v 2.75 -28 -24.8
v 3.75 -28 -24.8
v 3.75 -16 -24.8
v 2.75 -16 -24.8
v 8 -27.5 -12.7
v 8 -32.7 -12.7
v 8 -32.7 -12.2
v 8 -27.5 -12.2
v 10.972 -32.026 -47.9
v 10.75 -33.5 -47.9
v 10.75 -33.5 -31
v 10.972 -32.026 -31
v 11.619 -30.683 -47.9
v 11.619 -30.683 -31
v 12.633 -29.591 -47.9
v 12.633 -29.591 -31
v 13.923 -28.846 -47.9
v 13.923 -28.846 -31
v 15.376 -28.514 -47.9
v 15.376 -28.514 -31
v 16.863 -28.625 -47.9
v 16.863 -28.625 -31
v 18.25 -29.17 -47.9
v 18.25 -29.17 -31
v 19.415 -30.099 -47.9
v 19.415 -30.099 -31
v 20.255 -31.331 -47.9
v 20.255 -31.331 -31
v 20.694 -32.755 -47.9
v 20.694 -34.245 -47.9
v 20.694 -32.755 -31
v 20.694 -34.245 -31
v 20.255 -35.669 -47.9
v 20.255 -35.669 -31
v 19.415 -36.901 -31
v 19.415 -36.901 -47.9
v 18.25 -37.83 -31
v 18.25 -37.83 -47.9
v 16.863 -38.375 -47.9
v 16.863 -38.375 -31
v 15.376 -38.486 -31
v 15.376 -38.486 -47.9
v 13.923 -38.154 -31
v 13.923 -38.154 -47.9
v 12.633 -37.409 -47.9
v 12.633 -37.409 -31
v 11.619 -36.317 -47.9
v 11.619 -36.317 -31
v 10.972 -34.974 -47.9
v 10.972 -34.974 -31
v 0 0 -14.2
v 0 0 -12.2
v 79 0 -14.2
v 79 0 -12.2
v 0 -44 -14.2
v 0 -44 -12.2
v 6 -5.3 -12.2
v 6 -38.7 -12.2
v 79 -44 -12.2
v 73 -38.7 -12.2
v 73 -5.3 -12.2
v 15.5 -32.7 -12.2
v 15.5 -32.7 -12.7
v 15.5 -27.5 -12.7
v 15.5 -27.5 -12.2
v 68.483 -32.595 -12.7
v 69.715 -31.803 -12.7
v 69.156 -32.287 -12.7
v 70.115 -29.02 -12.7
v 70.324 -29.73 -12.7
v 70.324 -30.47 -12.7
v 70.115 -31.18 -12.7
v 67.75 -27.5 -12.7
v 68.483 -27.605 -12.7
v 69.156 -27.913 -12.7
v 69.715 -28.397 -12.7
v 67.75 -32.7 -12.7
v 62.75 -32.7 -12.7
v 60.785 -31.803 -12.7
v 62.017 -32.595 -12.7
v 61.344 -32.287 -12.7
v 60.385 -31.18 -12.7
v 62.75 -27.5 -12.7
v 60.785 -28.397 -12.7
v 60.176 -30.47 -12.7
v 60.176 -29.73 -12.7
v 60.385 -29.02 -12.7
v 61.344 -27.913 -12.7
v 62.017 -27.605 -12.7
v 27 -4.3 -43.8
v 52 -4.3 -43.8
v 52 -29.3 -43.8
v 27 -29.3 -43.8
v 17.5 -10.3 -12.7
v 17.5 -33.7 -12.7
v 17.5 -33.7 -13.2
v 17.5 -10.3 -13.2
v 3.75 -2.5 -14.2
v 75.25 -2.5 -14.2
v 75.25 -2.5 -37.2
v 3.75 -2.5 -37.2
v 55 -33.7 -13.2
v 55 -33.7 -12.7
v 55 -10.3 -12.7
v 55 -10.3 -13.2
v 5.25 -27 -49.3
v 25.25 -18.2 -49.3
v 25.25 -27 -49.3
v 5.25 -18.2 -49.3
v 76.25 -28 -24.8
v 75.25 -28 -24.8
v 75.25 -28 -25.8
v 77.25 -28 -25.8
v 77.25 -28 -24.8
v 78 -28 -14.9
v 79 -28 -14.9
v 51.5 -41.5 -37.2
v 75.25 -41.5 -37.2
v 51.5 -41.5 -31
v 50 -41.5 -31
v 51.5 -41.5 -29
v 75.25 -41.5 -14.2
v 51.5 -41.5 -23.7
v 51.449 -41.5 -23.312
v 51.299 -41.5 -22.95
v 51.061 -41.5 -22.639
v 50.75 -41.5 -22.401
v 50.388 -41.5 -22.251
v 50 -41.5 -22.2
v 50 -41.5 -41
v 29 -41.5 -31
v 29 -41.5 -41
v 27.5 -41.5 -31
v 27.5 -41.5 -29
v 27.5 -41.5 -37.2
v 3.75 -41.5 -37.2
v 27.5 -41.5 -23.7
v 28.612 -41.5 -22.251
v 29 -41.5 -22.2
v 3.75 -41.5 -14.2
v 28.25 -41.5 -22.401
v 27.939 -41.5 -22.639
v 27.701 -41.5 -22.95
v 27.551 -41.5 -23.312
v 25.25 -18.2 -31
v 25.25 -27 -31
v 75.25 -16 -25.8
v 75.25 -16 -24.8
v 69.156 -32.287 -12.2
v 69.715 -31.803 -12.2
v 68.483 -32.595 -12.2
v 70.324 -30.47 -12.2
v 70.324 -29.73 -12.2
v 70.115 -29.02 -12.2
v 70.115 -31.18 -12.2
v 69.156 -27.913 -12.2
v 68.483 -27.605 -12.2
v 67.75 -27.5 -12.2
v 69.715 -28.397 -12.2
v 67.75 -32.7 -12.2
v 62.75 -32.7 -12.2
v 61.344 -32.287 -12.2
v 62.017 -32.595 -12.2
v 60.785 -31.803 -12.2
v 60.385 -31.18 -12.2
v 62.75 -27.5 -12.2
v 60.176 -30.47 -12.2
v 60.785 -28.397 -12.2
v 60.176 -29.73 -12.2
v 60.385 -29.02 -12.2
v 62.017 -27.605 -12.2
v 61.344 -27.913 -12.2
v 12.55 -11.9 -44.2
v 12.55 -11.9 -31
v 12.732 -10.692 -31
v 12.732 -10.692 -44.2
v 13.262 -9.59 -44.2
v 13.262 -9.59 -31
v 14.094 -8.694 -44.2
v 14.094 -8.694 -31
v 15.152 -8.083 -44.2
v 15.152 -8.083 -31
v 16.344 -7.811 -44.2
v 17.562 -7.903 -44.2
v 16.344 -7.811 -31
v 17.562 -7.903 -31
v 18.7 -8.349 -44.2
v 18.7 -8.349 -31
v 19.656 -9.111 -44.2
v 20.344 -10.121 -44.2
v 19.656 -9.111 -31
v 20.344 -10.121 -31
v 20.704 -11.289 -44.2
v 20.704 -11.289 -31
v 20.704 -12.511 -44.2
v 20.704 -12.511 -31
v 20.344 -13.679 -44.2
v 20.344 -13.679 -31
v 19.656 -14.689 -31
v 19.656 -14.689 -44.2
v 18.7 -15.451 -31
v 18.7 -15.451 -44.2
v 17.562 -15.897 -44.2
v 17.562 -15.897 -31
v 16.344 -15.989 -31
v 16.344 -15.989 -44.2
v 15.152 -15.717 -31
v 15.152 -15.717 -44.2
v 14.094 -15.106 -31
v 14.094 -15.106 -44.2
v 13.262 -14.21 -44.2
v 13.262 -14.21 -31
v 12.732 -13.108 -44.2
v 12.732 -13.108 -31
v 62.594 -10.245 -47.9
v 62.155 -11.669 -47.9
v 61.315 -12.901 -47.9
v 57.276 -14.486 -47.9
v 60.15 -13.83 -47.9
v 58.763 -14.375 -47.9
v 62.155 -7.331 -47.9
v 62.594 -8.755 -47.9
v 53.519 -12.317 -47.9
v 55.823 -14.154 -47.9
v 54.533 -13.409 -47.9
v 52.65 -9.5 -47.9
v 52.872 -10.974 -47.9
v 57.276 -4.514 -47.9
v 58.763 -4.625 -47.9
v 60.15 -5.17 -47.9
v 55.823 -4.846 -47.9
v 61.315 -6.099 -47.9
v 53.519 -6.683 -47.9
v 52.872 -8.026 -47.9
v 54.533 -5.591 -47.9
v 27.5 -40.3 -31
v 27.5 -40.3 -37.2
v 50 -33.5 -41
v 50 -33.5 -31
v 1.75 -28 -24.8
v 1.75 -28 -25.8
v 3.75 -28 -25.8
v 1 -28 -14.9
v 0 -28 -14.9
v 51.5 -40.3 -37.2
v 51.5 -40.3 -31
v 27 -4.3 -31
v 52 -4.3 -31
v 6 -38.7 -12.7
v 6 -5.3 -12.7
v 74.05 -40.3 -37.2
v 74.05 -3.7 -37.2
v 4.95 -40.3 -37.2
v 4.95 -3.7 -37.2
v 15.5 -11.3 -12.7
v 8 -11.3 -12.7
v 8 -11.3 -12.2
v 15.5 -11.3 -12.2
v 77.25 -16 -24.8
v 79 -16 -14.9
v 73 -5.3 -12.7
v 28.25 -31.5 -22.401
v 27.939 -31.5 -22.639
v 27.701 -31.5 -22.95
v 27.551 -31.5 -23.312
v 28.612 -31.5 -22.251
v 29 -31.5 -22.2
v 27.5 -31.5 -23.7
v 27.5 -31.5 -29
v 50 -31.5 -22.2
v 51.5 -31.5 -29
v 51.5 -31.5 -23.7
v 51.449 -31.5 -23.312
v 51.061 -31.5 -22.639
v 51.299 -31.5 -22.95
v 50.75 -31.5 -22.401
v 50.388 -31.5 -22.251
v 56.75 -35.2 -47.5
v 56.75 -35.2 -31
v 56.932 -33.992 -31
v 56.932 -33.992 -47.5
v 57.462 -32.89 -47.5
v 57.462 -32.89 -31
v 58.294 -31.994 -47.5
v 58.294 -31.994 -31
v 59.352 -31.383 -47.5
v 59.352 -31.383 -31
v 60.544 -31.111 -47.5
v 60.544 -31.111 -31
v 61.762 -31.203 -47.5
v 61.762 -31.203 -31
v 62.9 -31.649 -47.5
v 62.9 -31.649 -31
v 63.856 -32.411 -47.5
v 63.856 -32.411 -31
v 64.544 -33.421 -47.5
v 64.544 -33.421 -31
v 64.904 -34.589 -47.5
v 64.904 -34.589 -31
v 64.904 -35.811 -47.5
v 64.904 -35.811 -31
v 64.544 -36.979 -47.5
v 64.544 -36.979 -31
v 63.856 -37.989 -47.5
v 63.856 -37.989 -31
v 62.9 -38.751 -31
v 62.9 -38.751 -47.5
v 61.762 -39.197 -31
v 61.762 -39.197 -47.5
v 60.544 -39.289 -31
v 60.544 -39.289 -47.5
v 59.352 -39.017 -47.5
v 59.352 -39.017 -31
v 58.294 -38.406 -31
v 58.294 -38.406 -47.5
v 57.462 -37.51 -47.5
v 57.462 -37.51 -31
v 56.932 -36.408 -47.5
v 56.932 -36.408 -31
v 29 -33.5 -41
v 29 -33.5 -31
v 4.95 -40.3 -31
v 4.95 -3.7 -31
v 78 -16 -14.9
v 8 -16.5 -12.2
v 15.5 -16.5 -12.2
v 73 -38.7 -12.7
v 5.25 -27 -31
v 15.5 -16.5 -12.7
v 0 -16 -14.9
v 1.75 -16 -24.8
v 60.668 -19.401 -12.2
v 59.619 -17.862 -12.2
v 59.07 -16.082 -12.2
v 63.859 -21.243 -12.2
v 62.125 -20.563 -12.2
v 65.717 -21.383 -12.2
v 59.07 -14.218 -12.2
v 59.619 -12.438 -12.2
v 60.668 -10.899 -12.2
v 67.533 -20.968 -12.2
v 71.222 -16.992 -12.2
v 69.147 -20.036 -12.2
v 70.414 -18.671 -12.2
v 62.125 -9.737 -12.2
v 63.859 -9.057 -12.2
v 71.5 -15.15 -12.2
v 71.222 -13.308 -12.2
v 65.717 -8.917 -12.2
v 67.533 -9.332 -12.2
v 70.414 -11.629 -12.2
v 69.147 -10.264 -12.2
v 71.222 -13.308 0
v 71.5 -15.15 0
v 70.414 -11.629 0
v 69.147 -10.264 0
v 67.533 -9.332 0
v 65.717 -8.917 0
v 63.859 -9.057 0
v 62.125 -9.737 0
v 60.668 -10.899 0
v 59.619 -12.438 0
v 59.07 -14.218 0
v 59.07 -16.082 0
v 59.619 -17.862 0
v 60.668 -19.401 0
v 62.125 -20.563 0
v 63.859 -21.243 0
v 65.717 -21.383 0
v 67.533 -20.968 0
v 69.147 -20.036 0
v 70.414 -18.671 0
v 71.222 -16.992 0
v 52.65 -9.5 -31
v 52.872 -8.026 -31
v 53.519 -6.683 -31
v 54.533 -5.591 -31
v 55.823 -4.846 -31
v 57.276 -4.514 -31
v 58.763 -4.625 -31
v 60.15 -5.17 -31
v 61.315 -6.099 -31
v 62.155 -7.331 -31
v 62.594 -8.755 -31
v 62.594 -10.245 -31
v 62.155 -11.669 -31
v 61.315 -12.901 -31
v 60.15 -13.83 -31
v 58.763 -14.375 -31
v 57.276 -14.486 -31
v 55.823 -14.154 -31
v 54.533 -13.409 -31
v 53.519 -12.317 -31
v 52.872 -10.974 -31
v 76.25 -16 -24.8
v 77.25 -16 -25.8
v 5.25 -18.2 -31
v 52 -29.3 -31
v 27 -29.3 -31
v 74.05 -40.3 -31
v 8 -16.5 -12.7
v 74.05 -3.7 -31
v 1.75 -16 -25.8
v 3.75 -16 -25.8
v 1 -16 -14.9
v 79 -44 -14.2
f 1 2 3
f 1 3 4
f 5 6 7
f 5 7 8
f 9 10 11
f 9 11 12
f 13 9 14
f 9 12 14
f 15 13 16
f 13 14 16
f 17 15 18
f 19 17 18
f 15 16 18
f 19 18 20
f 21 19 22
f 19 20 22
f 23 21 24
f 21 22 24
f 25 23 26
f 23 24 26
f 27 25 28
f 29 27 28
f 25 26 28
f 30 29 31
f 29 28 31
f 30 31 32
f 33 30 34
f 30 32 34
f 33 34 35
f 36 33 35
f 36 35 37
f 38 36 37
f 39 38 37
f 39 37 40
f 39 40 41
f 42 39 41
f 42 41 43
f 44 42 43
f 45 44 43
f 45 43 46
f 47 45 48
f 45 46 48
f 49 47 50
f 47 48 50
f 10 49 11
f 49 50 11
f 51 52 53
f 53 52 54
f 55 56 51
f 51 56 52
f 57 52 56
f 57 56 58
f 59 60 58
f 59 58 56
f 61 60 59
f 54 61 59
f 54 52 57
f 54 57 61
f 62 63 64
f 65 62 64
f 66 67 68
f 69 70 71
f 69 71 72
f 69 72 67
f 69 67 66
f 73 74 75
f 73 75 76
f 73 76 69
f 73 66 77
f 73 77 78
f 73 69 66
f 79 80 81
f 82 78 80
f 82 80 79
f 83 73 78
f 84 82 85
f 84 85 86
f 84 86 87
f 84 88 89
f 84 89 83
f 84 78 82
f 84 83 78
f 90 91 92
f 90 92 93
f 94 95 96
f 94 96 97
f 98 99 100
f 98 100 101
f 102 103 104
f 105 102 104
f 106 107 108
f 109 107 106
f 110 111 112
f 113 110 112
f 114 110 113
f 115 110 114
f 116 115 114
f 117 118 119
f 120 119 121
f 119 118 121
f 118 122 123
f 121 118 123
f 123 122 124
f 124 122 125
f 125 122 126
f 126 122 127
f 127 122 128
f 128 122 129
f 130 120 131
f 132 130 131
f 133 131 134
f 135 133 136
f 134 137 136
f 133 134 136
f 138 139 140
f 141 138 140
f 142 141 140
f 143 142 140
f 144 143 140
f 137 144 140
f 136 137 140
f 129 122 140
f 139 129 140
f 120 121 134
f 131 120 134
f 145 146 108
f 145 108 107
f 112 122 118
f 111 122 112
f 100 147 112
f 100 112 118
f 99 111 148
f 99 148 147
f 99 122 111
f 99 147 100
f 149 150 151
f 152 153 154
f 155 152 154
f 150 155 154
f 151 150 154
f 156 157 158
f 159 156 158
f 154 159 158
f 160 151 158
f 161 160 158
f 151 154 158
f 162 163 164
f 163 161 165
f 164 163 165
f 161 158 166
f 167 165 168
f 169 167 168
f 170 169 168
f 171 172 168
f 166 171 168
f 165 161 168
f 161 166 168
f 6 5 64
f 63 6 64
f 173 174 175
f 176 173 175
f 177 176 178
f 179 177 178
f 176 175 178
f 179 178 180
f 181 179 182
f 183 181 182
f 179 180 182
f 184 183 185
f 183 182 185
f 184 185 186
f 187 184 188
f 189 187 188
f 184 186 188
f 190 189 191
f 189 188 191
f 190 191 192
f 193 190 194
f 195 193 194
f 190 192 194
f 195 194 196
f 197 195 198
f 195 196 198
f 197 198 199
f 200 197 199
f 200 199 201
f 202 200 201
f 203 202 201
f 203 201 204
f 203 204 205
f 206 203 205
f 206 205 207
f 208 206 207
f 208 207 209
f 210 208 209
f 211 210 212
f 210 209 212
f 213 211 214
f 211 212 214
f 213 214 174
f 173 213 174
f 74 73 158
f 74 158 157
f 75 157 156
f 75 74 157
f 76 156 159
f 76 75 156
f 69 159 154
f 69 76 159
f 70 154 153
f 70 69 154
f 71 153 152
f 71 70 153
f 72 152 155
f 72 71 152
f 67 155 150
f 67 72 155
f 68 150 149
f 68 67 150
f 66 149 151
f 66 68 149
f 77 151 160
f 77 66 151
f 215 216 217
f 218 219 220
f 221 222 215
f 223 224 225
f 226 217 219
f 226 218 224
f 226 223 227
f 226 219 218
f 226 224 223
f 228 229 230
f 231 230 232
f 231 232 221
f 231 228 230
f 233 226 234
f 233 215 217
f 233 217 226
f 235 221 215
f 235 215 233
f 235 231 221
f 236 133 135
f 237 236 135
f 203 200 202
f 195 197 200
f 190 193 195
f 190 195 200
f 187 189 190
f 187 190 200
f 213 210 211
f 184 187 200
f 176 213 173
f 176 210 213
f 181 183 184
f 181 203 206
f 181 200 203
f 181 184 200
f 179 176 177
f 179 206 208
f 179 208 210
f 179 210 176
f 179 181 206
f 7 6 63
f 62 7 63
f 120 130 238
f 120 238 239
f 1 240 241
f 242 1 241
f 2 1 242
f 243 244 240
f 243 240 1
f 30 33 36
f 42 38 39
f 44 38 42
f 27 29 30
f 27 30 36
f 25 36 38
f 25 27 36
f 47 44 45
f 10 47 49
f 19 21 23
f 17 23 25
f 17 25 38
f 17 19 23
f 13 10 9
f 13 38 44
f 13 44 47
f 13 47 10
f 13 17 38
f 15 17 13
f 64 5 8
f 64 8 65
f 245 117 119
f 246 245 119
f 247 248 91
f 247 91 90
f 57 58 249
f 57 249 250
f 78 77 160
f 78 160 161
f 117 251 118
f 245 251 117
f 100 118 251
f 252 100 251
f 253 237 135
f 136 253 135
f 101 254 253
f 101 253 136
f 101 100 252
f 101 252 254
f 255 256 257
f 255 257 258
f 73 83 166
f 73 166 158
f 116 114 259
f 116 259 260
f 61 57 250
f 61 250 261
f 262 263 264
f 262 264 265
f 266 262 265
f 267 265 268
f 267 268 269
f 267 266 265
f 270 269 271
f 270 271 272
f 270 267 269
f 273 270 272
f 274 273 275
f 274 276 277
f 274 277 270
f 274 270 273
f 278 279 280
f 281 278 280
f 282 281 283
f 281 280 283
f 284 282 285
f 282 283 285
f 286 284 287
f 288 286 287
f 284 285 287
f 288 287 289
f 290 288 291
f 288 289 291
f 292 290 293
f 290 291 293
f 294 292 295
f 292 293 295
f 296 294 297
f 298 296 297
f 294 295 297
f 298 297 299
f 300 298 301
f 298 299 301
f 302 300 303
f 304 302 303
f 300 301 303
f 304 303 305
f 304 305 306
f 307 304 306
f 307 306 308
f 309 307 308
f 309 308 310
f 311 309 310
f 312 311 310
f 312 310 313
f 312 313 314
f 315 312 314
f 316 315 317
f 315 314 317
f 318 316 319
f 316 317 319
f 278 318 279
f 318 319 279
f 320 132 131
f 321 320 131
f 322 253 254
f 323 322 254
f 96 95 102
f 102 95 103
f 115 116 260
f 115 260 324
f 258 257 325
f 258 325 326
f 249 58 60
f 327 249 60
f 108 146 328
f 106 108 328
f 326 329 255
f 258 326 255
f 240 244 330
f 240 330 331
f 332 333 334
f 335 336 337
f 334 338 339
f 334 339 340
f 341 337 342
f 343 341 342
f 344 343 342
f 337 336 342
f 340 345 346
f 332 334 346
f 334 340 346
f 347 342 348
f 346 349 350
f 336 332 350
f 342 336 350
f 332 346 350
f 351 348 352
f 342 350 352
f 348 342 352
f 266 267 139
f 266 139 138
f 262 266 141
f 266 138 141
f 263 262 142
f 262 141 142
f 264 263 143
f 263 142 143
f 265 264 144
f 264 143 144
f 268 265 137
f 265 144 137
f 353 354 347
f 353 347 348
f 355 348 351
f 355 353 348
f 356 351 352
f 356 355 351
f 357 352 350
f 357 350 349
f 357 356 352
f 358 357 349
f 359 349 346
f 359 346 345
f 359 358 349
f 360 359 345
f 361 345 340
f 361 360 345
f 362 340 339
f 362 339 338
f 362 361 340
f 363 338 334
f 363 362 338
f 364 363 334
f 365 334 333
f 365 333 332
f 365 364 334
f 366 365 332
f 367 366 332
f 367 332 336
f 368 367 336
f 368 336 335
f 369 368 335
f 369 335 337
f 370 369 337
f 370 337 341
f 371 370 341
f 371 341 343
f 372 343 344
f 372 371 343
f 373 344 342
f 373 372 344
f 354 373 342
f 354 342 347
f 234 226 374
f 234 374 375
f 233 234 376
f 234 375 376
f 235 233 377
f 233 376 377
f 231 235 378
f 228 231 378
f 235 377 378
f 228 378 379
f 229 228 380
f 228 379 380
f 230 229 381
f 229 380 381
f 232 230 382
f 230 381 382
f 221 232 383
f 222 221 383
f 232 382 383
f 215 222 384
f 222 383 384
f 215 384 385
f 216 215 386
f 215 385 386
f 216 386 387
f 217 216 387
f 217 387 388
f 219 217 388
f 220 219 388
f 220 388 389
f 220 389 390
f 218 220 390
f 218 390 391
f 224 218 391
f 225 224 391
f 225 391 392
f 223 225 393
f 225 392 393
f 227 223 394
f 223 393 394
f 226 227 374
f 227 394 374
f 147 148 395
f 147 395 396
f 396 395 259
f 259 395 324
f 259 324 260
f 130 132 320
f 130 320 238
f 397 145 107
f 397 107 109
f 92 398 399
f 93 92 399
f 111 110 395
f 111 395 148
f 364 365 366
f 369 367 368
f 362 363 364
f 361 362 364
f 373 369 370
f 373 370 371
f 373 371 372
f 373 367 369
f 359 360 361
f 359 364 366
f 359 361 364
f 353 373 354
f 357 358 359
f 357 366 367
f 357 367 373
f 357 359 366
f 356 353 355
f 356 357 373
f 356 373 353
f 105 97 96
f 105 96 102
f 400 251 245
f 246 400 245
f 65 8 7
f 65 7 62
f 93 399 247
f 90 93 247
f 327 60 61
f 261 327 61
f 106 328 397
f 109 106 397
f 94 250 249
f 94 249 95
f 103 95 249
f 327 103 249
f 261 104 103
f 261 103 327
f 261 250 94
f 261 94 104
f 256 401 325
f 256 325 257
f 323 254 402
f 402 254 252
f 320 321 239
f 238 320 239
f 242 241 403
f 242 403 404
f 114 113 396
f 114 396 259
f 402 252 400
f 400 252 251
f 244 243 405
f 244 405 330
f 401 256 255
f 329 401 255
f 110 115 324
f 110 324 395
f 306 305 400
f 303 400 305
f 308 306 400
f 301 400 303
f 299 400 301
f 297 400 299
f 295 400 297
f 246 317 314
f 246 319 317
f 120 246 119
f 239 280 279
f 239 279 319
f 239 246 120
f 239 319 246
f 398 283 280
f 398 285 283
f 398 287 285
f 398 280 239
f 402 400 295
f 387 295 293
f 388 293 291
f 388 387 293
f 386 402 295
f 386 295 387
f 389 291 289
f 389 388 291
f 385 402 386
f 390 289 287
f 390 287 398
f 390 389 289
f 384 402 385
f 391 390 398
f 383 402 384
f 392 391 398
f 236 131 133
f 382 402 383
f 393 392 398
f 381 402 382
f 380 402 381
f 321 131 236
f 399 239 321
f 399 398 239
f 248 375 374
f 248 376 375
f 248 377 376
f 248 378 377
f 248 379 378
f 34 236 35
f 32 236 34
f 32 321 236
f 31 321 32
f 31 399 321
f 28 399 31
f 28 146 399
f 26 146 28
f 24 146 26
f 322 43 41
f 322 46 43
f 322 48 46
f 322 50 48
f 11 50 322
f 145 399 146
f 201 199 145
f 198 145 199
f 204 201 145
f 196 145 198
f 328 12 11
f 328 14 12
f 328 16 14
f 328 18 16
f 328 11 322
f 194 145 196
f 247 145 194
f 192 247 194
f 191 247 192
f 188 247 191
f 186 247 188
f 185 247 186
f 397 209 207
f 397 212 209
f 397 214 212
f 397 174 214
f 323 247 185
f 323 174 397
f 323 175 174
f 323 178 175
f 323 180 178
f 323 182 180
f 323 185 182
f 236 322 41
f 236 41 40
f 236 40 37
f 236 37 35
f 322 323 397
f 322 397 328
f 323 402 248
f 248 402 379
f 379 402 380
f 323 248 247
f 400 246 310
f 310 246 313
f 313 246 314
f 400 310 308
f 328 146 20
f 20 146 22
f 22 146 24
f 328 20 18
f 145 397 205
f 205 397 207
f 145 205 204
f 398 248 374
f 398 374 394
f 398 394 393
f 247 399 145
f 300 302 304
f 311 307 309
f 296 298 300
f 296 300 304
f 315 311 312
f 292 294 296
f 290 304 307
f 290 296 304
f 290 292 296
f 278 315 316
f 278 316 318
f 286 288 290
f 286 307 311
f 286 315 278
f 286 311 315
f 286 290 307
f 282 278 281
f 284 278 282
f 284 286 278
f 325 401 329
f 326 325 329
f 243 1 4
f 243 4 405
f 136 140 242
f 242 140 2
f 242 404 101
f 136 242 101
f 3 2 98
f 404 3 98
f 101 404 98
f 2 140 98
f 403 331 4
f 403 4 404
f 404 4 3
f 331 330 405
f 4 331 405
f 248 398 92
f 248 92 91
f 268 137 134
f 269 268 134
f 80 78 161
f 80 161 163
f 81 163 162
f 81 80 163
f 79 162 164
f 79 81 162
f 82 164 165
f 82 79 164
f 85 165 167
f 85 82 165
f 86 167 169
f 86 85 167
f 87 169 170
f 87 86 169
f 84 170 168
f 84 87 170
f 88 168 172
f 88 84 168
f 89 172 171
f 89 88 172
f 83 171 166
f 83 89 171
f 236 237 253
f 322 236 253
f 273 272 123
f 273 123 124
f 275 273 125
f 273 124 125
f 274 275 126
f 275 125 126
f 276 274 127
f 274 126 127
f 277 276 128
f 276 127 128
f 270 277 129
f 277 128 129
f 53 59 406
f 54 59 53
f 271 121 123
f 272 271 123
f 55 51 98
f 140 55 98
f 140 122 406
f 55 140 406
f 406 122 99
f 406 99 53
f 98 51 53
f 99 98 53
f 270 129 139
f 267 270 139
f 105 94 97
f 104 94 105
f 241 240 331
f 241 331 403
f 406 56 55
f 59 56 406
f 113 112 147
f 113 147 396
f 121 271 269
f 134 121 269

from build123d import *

# Parameters (mm, degrees)
SKETCH_1_R          = 6.25
EXTRUDE_1_DEPTH     = 12.2
EXTRUDE_START       = -12.2
SKETCH_1_3_W        = 79
SKETCH_1_3_H        = 44
SKETCH_1_3_W_2      = 67
SKETCH_1_3_H_2      = 33.4
EXTRUDE_2_DEPTH     = 2
EXTRUDE_START_2     = -14.2
SKETCH_1_4_W        = 67
SKETCH_1_4_H        = 33.4
EXTRUDE_3_DEPTH     = 1.5
EXTRUDE_START_3     = -12.7
SKETCH_1_5_W        = 7.5
SKETCH_1_5_H        = 5.2
EXTRUDE_4_DEPTH     = 0.5
EXTRUDE_4_2_DEPTH   = 0.5
EXTRUDE_4_3_DEPTH   = 0.5
SKETCH_2_W          = 71.5
SKETCH_2_H          = 39
EXTRUDE_5_DEPTH     = 23
CUT_EXTRUDE_START   = -12.7
SKETCH_1_7_W        = 37.5
SKETCH_1_7_H        = 23.4
CUT_EXTRUDE_3_DEPTH = 0.5
EXTRUDE_START_4     = -13.5
EXTRUDE_6_DEPTH     = 12
CUT_EXTRUDE_4_DEPTH = 10
SKETCH_4_3_W        = 21
SKETCH_4_3_H        = 12
EXTRUDE_7_DEPTH     = 8
EXTRUDE_START_5     = -12
SKETCH_7_W          = 24
SKETCH_7_H          = 20
EXTRUDE_8_DEPTH     = 2
CUT_EXTRUDE_5_DEPTH = 6.2
SKETCH_9_W          = 25
SKETCH_9_H          = 25
EXTRUDE_9_DEPTH     = 12.8
SKETCH_9_3_R        = 4.1
EXTRUDE_10_DEPTH    = 13.2
SKETCH_9_5_R        = 5
EXTRUDE_12_DEPTH    = 16.9
SKETCH_9_6_R        = 4.1
EXTRUDE_13_DEPTH    = 16.5
SKETCH_9_7_W        = 20
SKETCH_9_7_H        = 8.8
EXTRUDE_14_DEPTH    = 18.3


with BuildPart() as part:
    # 草图1 → 凸台-拉伸1 (new body)
    with BuildSketch(Plane.XY):
        with Locations((65.25, -15.15)):
            Circle(SKETCH_1_R)
    extrude(amount=-EXTRUDE_1_DEPTH)


with BuildPart() as body_2:
    # 草图1<3> → 凸台-拉伸2 (new body)
    with BuildSketch(Plane.XY.offset(EXTRUDE_START)):
        with Locations((39.5, -22)):
            Rectangle(SKETCH_1_3_W, SKETCH_1_3_H)
        with Locations((39.5, -22)):
            Rectangle(SKETCH_1_3_W_2, SKETCH_1_3_H_2, mode=Mode.SUBTRACT)
    extrude(amount=-EXTRUDE_2_DEPTH)

    # 草图1<4> → 凸台-拉伸3 (add)
    with BuildSketch(Plane.XY.offset(EXTRUDE_START_2)):
        with Locations((39.5, -22)):
            Rectangle(SKETCH_1_4_W, SKETCH_1_4_H)
    extrude(amount=EXTRUDE_3_DEPTH)

    # 草图2 → 凸台-拉伸5 (add)
    with BuildSketch(Plane(origin=(0, 0, -14.2), x_dir=(-1, 0, 0), z_dir=(0, 0, -1))):
        with Locations((-39.5, -22)):
            Rectangle(SKETCH_2_W, SKETCH_2_H)
    extrude(amount=EXTRUDE_5_DEPTH)

    # 草图1<7> → 切除-拉伸3 (cut)
    with BuildSketch(Plane.XY.offset(CUT_EXTRUDE_START)):
        with Locations((36.25, -22)):
            Rectangle(SKETCH_1_7_W, SKETCH_1_7_H)
    extrude(amount=-CUT_EXTRUDE_3_DEPTH, mode=Mode.SUBTRACT)

    # 草图3 → 凸台-拉伸6 (add)
    with BuildSketch(Plane.XZ.offset(41.5).offset(EXTRUDE_START_4)):
        Polygon((1.75, -24.8), (1.75, -25.8), (3.75, -25.8), (3.75, -24.8), (2.75, -24.8), (1, -14.9), (0, -14.9), align=None)
        Polygon((75.25, -24.8), (75.25, -25.8), (77.25, -25.8), (77.25, -24.8), (79, -14.9), (78, -14.9), (76.25, -24.8), align=None)
    extrude(amount=-EXTRUDE_6_DEPTH)

    # 草图4 → 切除-拉伸4 (cut)
    with BuildSketch(Plane.XZ.offset(41.5)):
        with BuildLine():
            Line((50, -22.2), (29, -22.2))
            ThreePointArc((29, -22.2), (27.939339828, -22.639339828), (27.5, -23.7))
            Line((27.5, -23.7), (27.5, -37.2))
            Line((27.5, -37.2), (51.5, -37.2))
            Line((51.5, -37.2), (51.5, -23.7))
            ThreePointArc((51.5, -23.7), (51.060660172, -22.639339828), (50, -22.2))
        make_face()
    extrude(amount=-CUT_EXTRUDE_4_DEPTH, mode=Mode.SUBTRACT)



with BuildPart() as body_3:
    # 草图1<5> → 凸台-拉伸4 (new body)
    with BuildSketch(Plane.XY.offset(EXTRUDE_START_3)):
        with Locations((11.75, -13.9)):
            Rectangle(SKETCH_1_5_W, SKETCH_1_5_H)
    extrude(amount=EXTRUDE_4_DEPTH)


with BuildPart() as body_4:
    # 草图1<5> → Extrude 4 2 (new body)
    with BuildSketch(Plane.XY.offset(EXTRUDE_START_3)):
        with Locations((11.75, -30.1)):
            Rectangle(SKETCH_1_5_W, SKETCH_1_5_H)
    extrude(amount=EXTRUDE_4_2_DEPTH)


with BuildPart() as body_5:
    # 草图1<5> → Extrude 4 3 (new body)
    with BuildSketch(Plane.XY.offset(EXTRUDE_START_3)):
        with BuildLine():
            Line((62.75, -27.5), (67.75, -27.5))
            ThreePointArc((67.75, -27.5), (70.35, -30.1), (67.75, -32.7))
            Line((67.75, -32.7), (62.75, -32.7))
            ThreePointArc((62.75, -32.7), (60.15, -30.1), (62.75, -27.5))
        make_face()
    extrude(amount=EXTRUDE_4_3_DEPTH)


with BuildPart() as body_6:
    # 草图4<3> → 凸台-拉伸7 (new body)
    with BuildSketch(Plane.XZ.offset(41.5)):
        with Locations((39.5, -35)):
            Rectangle(SKETCH_4_3_W, SKETCH_4_3_H)
    extrude(amount=-EXTRUDE_7_DEPTH)


with BuildPart() as body_2_1:
    add(body_2.part)

    add(body_6.part)  # 凸台-拉伸8 merges body 6
    # 草图7 → 凸台-拉伸8 (add)
    with BuildSketch(Plane(origin=(0, 0, -41), x_dir=(-1, 0, 0), z_dir=(0, 0, -1)).offset(EXTRUDE_START_5)):
        with Locations((-39.5, -31.5)):
            Rectangle(SKETCH_7_W, SKETCH_7_H)
    extrude(amount=EXTRUDE_8_DEPTH)

    # 草图8 → 切除-拉伸5 (cut)
    with BuildSketch(Plane(origin=(0, 0, -37.2), x_dir=(-1, 0, 0), z_dir=(0, 0, -1))):
        Polygon((-4.95, -3.7), (-74.05, -3.7), (-74.05, -40.3), (-51.5, -40.3), (-51.5, -31.5), (-27.5, -31.5), (-27.5, -40.3), (-4.95, -40.3), align=None)
    extrude(amount=-CUT_EXTRUDE_5_DEPTH, mode=Mode.SUBTRACT)

    # 草图9 → 凸台-拉伸9 (add)
    with BuildSketch(Plane(origin=(0, 0, -31), x_dir=(-1, 0, 0), z_dir=(0, 0, -1))):
        with Locations((-39.5, -16.8)):
            Rectangle(SKETCH_9_W, SKETCH_9_H)
    extrude(amount=EXTRUDE_9_DEPTH)

    # 草图9<3> → 凸台-拉伸10 (add)
    with BuildSketch(Plane(origin=(0, 0, -31), x_dir=(-1, 0, 0), z_dir=(0, 0, -1))):
        with Locations((-16.65, -11.9)):
            Circle(SKETCH_9_3_R)
    extrude(amount=EXTRUDE_10_DEPTH)

    # 草图9<5> → 凸台-拉伸12 (add)
    with BuildSketch(Plane(origin=(0, 0, -31), x_dir=(-1, 0, 0), z_dir=(0, 0, -1))):
        with Locations((-57.65, -9.5)):
            Circle(SKETCH_9_5_R)
        with Locations((-15.75, -33.5)):
            Circle(SKETCH_9_5_R)
    extrude(amount=EXTRUDE_12_DEPTH)

    # 草图9<6> → 凸台-拉伸13 (add)
    with BuildSketch(Plane(origin=(0, 0, -31), x_dir=(-1, 0, 0), z_dir=(0, 0, -1))):
        with Locations((-60.85, -35.2)):
            Circle(SKETCH_9_6_R)
    extrude(amount=EXTRUDE_13_DEPTH)

    # 草图9<7> → 凸台-拉伸14 (add)
    with BuildSketch(Plane(origin=(0, 0, -31), x_dir=(-1, 0, 0), z_dir=(0, 0, -1))):
        with Locations((-15.25, -22.6)):
            Rectangle(SKETCH_9_7_W, SKETCH_9_7_H)
    extrude(amount=EXTRUDE_14_DEPTH)


solid = Compound([part.part, body_3.part, body_4.part, body_5.part, body_2_1.part])
